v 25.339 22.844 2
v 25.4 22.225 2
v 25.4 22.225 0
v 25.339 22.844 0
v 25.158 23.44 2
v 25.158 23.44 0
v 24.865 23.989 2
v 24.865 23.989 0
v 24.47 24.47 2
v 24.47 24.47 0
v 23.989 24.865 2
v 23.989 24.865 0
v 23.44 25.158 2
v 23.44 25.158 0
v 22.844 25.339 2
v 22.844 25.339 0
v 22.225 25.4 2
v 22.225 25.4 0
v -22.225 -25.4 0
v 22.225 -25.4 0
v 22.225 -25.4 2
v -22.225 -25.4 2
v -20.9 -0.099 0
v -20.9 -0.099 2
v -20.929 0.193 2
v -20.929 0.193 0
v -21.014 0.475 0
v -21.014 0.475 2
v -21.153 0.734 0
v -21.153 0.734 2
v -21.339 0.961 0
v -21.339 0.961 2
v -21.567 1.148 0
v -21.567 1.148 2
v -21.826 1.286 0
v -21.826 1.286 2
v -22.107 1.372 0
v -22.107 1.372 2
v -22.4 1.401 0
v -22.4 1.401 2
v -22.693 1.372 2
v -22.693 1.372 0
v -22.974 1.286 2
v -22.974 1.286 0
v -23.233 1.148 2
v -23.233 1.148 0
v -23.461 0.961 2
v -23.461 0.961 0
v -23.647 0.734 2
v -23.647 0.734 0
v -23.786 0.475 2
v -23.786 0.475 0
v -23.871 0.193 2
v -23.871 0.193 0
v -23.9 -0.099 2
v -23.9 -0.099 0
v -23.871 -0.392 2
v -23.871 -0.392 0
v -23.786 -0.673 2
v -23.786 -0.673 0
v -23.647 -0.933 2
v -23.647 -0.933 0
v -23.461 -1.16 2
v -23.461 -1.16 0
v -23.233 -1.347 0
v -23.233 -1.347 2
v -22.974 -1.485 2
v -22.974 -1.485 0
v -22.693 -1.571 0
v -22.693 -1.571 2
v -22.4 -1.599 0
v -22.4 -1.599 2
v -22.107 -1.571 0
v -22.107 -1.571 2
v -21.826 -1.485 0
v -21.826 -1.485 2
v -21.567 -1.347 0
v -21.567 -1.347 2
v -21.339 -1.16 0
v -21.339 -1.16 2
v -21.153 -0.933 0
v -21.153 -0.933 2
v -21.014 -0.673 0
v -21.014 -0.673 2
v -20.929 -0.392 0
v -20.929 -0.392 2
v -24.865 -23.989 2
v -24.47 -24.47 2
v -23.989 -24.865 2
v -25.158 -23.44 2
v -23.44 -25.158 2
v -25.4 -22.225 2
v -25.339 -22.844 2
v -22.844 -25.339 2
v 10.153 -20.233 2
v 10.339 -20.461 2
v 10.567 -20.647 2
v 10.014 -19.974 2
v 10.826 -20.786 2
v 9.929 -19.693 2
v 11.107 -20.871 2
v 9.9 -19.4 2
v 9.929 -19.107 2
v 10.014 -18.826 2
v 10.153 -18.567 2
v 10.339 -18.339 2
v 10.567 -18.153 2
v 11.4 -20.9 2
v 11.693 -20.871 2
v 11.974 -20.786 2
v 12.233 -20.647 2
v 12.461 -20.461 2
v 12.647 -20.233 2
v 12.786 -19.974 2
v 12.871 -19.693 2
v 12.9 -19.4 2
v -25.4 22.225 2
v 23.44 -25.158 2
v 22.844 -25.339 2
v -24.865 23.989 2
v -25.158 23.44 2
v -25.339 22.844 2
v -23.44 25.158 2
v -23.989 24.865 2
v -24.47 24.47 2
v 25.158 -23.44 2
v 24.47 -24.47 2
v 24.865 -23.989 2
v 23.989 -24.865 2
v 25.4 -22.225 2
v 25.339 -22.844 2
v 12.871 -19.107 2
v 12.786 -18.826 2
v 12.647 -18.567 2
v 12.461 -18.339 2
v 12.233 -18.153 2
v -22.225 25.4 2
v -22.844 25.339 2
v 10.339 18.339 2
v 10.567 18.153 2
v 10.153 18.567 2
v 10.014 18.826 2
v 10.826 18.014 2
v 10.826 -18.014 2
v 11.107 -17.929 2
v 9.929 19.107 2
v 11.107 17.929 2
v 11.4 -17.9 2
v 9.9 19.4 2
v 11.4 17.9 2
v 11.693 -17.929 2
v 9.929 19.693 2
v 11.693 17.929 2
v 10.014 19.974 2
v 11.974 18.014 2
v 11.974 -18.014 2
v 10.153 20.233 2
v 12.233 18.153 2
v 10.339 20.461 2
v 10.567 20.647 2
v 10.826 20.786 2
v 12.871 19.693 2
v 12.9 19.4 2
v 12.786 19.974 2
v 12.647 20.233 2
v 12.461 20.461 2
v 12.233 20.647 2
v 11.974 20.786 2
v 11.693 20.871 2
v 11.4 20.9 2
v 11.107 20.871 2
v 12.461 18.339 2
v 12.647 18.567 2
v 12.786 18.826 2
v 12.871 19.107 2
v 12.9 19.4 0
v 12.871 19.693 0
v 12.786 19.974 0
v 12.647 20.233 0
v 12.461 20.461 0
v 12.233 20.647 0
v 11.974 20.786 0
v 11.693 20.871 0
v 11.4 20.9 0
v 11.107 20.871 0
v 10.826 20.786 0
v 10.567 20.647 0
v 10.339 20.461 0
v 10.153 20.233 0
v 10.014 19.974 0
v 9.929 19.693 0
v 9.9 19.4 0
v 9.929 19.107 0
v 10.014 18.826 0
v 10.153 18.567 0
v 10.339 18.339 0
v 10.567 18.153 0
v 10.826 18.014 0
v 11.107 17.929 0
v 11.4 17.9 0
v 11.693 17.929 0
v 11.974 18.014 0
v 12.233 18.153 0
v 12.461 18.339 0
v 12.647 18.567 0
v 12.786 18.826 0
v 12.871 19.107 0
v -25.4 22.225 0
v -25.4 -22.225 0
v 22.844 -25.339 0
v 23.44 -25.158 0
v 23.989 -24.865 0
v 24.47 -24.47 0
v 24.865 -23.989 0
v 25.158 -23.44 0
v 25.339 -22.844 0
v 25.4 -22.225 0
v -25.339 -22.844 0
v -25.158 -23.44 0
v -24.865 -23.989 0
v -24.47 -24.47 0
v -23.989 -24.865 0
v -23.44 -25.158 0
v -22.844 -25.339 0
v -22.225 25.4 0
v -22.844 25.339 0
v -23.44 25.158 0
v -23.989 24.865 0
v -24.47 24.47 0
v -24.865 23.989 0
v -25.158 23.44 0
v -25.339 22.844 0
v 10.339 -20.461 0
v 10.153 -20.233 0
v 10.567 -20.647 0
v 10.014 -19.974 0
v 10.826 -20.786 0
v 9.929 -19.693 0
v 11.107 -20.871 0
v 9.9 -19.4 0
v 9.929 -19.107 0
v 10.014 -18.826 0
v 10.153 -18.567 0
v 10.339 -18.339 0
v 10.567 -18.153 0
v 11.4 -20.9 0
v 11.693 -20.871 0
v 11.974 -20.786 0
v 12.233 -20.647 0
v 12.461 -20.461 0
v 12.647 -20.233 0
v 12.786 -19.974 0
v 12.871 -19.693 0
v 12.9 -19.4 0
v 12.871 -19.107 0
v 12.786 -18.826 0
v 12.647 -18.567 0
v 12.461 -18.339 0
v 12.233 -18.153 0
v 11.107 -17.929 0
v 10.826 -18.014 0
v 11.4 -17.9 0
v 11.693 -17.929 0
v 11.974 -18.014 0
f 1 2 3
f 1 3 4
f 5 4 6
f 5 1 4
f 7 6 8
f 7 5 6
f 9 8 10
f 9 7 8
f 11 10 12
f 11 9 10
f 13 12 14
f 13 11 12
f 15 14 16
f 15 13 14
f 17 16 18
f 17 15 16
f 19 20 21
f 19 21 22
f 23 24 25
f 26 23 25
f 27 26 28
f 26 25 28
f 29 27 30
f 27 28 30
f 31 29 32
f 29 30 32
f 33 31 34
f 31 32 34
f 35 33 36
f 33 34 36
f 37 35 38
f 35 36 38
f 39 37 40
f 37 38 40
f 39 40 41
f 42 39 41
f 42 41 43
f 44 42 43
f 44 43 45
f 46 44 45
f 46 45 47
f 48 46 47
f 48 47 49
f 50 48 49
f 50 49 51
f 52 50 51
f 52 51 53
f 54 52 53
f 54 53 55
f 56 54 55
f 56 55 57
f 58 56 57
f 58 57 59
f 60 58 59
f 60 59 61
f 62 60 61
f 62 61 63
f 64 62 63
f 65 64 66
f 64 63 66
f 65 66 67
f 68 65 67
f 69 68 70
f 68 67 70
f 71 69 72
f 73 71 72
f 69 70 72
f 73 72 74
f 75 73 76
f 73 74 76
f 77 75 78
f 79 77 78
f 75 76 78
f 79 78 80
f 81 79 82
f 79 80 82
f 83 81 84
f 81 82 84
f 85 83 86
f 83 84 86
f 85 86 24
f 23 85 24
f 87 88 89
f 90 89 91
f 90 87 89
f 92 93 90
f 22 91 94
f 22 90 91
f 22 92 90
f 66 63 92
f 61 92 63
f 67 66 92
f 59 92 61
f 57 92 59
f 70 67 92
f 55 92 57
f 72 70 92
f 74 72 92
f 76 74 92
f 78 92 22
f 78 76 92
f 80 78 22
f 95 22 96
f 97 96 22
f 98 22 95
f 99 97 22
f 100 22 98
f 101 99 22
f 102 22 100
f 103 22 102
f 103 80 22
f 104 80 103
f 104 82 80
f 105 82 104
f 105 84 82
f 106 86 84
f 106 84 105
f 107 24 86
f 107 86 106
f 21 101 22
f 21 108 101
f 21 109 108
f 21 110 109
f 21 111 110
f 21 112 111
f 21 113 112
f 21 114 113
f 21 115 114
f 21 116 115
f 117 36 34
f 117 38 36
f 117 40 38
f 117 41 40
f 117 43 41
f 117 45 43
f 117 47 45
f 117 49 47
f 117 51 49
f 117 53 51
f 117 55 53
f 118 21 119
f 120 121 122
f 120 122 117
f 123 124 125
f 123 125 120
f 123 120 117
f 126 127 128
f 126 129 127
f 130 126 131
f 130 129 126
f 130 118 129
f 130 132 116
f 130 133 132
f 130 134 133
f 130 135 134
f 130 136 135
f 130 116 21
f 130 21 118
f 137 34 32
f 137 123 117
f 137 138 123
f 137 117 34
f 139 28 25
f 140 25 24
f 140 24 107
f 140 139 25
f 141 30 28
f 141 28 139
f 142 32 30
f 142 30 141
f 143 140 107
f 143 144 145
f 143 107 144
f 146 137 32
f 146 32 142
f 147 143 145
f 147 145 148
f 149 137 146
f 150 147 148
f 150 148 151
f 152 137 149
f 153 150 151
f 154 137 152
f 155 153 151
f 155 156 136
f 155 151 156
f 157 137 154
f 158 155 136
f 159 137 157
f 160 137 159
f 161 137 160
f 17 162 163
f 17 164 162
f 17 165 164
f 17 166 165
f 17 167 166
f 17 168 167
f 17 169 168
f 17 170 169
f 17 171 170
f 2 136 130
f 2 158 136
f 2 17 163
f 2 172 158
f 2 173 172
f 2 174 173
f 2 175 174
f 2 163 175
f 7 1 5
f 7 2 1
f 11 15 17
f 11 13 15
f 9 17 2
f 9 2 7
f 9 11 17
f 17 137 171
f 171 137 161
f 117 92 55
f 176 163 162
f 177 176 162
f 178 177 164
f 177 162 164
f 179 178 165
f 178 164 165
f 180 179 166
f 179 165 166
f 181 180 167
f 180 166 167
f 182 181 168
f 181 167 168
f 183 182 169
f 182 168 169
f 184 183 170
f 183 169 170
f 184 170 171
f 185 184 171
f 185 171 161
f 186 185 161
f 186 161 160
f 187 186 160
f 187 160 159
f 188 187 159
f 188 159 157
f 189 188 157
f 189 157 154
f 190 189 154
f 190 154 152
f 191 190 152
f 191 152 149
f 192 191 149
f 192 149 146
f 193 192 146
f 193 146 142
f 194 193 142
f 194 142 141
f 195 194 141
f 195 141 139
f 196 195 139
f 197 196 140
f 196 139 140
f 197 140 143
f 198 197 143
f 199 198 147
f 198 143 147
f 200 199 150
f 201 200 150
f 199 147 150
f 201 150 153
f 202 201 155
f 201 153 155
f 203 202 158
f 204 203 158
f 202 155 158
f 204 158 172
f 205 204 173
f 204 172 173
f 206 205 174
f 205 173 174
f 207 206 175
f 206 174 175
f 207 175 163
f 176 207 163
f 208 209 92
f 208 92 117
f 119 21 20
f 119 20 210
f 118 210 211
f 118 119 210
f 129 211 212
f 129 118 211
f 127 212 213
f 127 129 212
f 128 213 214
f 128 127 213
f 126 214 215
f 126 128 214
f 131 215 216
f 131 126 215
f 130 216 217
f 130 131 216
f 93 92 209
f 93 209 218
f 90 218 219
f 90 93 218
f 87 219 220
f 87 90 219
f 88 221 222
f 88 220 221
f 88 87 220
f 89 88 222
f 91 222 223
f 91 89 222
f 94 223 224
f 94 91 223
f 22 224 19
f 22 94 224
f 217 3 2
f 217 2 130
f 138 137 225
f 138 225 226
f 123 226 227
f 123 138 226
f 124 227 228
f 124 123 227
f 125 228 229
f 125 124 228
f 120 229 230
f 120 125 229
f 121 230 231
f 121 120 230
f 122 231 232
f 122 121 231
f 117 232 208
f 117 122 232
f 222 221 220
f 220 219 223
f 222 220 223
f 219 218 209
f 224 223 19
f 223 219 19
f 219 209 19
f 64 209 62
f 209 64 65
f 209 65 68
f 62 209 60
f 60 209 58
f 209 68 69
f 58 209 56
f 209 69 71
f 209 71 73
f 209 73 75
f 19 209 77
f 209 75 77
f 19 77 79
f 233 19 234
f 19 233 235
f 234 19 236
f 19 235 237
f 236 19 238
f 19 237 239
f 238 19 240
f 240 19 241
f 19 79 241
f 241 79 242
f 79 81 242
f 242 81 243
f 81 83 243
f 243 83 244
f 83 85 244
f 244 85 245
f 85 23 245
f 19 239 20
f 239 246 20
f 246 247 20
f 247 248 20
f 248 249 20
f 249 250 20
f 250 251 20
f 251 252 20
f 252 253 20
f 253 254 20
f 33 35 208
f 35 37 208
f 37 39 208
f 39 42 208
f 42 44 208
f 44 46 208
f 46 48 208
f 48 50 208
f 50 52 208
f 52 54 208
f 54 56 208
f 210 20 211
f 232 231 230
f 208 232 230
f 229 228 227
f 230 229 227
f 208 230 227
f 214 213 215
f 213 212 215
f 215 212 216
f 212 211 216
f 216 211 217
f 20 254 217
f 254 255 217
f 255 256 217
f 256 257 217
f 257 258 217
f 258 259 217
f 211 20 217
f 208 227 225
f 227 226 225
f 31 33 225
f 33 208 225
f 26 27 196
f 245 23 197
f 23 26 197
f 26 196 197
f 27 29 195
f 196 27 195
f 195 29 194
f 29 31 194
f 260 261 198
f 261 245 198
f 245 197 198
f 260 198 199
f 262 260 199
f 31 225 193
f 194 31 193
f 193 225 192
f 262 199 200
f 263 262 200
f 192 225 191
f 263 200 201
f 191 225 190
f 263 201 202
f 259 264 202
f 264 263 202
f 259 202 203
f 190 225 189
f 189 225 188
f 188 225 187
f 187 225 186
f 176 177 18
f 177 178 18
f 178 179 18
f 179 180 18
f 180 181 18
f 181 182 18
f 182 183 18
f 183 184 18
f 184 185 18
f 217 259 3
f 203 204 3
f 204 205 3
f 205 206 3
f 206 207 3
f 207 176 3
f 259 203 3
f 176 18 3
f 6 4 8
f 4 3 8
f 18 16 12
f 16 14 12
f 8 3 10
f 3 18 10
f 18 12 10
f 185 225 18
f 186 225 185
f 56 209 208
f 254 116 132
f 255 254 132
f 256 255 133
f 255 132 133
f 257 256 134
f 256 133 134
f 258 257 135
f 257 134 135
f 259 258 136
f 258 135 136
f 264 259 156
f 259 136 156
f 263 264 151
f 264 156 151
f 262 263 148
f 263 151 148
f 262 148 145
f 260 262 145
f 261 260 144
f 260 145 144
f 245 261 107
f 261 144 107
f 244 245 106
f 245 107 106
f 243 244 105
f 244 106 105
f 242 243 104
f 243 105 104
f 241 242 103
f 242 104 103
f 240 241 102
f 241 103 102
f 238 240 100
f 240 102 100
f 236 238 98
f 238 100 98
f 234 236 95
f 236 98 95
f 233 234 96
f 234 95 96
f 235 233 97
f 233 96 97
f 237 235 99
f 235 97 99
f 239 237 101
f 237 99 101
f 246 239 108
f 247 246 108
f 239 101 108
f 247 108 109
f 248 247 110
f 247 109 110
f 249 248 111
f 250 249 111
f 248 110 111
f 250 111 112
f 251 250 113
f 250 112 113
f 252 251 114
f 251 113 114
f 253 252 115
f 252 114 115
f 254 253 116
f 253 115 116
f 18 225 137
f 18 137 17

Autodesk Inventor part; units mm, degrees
ref_plane "YZ Plane" through (0, 0, 0) normal (1, 0, 0) x (0, 1, 0)
ref_plane "XZ Plane" through (0, 0, 0) normal (0, 1, 0) x (-1, 0, 0)
ref_plane "XY Plane" through (0, 0, 0) normal (0, 0, 1) x (1, 0, 0)
sketch "Sketch1" plane through (0, 0, 0) normal (0, 0, 1) x (1, 0, 0)
  line L0 (-25.4, 25.4) -> (25.4, 25.4)
  line L1 (25.4, 25.4) -> (25.4, -25.4)
  line L2 (25.4, -25.4) -> (-25.4, -25.4)
  line L3 (-25.4, -25.4) -> (-25.4, 25.4)
  point P0 (0, 0)
  dimension "d0" = 25.4
  dimension "d1" = 50.8
  dimension "d2" = 50.8
  dimension "d3" = 25.4
extrude "Extrusion1" add sketch "Sketch1" along normal blind 2
fillet "Fillet1" radius 3.175 4 edges at (25.4, 25.4, 1) (25.4, -25.4, 1) (-25.4, 25.4, 1) (-25.4, -25.4, 1)
sketch "Sketch2" plane through (0, 0, 2) normal (0, 0, 1) x (1, 0, 0)
  circle A0 centre (-22.4, -0.0994) radius 1.5
  circle A1 centre (11.4, -19.4) radius 1.5
  circle A2 centre (11.4, 19.4) radius 1.5
  line L0 (-25.4, 22.225) -> (-25.4, -22.225) projected
  line L1 (22.225, 25.4) -> (-22.225, 25.4) projected
  line L2 (-22.225, -25.4) -> (22.225, -25.4) projected
  line L3 (25.4, -22.225) -> (25.4, 22.225) projected
  point P0 (0, 0)
  dimension "d7" = 3
  dimension "d9" = 3
  dimension "d17" = 3
  dimension "d18" = 6
  dimension "d19" = 6
  dimension "d20" = 14
  dimension "d21" = 14
  dimension "d22" = 3
extrude "Extrusion2" cut sketch "Sketch2" against normal blind 2
equation "\"d0\" = 0.5 * d1"
equation "\"d3\" = 0.5 * d2"
equation "\"d9\" = d7"
equation "\"d19\" = d18"
equation "\"d21\" = d20"
equation "\"d22\" = d7"
properties part number "breadbord_2_inch"
